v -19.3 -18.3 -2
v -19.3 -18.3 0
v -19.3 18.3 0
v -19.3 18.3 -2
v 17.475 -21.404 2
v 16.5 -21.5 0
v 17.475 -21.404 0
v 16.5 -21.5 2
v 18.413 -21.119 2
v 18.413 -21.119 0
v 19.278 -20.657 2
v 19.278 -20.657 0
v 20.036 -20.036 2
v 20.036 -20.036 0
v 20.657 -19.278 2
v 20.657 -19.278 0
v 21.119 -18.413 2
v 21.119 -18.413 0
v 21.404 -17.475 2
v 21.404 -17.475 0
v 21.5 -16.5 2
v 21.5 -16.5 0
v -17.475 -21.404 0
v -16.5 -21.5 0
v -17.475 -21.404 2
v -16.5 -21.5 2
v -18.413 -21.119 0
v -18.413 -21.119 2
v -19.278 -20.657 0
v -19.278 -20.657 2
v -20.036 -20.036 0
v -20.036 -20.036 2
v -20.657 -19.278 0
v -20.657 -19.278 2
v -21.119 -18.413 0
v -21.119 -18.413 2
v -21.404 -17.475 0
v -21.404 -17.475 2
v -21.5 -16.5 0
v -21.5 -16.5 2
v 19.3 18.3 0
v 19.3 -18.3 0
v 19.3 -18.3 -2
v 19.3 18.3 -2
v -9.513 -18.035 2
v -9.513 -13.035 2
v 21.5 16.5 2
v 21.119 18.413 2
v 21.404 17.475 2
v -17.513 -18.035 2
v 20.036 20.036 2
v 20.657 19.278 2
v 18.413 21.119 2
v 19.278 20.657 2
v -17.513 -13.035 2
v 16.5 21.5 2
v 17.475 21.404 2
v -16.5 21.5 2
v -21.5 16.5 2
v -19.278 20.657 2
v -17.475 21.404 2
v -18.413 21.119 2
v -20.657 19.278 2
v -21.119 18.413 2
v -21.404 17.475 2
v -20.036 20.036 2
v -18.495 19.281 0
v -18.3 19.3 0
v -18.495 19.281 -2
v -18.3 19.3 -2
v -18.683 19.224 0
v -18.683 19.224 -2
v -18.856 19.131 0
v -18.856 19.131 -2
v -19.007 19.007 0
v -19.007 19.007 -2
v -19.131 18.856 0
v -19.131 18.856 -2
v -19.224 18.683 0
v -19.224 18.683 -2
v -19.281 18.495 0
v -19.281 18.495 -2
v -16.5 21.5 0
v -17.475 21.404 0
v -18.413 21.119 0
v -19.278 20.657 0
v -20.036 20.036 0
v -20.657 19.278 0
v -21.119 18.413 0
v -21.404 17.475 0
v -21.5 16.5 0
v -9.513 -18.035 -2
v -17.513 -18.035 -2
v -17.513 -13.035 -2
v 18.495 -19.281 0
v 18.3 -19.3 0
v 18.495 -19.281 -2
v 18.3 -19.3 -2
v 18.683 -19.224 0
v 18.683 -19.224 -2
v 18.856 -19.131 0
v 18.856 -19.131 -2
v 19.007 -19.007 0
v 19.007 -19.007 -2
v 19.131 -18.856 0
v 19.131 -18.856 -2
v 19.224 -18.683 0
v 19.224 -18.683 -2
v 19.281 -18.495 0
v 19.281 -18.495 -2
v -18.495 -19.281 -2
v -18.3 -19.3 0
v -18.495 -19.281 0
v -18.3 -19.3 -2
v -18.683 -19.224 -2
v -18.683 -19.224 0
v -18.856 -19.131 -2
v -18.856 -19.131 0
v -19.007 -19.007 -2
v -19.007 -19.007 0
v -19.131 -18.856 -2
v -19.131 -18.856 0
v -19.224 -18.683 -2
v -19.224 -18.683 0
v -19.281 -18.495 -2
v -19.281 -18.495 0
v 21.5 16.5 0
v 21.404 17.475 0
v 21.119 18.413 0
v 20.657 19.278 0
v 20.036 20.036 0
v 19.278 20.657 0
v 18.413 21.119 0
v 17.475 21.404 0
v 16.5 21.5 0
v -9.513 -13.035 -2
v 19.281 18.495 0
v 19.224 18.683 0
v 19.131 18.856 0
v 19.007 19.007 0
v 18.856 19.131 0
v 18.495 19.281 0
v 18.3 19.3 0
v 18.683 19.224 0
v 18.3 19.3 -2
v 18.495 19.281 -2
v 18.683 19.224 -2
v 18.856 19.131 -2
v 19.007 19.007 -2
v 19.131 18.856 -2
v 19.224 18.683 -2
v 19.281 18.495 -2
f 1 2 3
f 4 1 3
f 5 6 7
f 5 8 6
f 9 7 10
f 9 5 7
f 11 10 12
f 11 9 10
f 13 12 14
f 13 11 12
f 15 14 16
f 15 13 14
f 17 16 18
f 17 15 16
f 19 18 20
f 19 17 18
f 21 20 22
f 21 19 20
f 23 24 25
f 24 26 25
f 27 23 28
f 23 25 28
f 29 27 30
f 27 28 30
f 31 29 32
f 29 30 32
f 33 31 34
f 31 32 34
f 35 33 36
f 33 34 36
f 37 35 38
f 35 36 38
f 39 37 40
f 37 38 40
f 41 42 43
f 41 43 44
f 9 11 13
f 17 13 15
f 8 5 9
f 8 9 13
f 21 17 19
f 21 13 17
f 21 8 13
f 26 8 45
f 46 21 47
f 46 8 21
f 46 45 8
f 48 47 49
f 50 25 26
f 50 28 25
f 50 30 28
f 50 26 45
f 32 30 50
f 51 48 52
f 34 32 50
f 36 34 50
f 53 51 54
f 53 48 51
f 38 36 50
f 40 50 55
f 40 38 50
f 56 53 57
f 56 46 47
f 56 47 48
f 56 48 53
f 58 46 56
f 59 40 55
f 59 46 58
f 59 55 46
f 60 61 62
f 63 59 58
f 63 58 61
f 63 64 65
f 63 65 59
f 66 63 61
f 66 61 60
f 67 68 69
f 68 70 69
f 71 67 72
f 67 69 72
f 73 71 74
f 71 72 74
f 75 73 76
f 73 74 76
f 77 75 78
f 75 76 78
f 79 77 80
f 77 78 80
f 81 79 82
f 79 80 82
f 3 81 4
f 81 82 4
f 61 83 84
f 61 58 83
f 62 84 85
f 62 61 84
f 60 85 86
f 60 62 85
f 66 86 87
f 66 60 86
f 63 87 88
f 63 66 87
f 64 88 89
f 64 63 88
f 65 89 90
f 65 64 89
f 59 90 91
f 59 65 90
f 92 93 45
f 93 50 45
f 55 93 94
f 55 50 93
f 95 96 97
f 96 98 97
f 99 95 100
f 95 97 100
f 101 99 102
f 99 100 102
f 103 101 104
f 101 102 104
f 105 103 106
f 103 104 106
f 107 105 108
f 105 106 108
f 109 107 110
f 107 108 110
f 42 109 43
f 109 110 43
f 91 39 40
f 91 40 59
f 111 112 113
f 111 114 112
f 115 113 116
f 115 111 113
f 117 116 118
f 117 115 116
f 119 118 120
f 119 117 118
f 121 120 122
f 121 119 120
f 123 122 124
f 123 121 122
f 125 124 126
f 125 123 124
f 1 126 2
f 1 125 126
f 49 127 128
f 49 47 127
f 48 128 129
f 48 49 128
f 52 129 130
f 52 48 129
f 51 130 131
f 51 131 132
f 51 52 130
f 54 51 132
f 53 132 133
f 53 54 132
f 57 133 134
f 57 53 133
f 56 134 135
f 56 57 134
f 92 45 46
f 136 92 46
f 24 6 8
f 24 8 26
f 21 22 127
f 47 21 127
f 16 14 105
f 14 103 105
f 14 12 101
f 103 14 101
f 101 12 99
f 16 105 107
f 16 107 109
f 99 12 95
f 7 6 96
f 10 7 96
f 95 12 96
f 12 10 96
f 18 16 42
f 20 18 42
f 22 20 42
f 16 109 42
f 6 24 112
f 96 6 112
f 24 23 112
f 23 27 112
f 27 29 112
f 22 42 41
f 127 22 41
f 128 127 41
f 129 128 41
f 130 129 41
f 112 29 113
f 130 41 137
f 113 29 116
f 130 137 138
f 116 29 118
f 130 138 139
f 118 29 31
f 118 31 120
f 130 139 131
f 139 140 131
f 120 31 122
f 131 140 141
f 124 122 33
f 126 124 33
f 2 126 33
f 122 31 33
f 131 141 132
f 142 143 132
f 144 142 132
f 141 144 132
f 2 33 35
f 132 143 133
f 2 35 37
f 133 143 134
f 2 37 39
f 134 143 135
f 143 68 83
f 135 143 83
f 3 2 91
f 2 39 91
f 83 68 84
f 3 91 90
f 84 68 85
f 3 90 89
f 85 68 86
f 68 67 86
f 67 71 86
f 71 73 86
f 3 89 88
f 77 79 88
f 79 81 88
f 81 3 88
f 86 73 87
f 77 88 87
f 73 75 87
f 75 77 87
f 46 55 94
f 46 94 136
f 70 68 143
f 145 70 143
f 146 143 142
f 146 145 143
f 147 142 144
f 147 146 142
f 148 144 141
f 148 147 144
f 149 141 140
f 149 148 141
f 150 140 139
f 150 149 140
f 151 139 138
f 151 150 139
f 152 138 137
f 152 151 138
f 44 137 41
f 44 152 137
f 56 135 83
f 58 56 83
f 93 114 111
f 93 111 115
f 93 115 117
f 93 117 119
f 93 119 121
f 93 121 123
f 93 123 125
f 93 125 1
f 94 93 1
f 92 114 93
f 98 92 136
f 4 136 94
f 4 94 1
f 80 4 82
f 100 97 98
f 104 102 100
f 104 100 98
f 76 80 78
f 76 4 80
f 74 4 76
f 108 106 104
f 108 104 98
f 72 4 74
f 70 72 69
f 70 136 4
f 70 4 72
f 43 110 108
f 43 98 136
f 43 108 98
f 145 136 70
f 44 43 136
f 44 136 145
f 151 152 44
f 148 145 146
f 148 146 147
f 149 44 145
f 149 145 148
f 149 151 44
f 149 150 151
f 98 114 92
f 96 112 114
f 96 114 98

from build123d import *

# Parameters (mm, degrees)
SKETCH1_W           = 43.000000106
SKETCH1_H           = 43
BOSS_EXTRUDE1_DEPTH = 2
FILLET1_R           = 5
SKETCH2_W           = 8
SKETCH2_H           = 5
CUT_EXTRUDE1_DEPTH  = 31.471298008
SKETCH3_W           = 38.6
SKETCH3_H           = 38.6
SKETCH3_W_2         = 5
SKETCH3_H_2         = 8
BOSS_EXTRUDE2_DEPTH = 2
FILLET3_R           = 1


with BuildPart() as part:
    # Sketch1 → Boss-Extrude1 (new body)
    with BuildSketch(Plane(origin=(0, 0, 0), x_dir=(0, 1, 0), z_dir=(0, 0, 1))):
        Rectangle(SKETCH1_W, SKETCH1_H)
    extrude(amount=BOSS_EXTRUDE1_DEPTH)

    # Fillet1
    fillet1_edges = [part.edges().sort_by_distance(p)[0] for p in [
        (-21.5, -21.500000053, 1),
        (-21.5, 21.500000053, 1),
        (21.5, 21.500000053, 1),
        (21.5, -21.500000053, 1),
    ]]
    fillet(fillet1_edges, radius=FILLET1_R)

    # Sketch2 → Cut-Extrude1 (cut, through all)
    with BuildSketch(Plane.XY.offset(2)):
        with Locations((-13.512700472, -15.534578128)):
            Rectangle(SKETCH2_W, SKETCH2_H)
    extrude(amount=-CUT_EXTRUDE1_DEPTH, mode=Mode.SUBTRACT)

    # Sketch3 → Boss-Extrude2 (add)
    with BuildSketch(Plane.YX):
        Rectangle(SKETCH3_W, SKETCH3_H)
        with Locations((-15.534578128, -13.512700472)):
            Rectangle(SKETCH3_W_2, SKETCH3_H_2, mode=Mode.SUBTRACT)
    extrude(amount=BOSS_EXTRUDE2_DEPTH)

    # Fillet3
    fillet3_edges = [part.edges().sort_by_distance(p)[0] for p in [
        (-19.3, -19.3, -1),
        (-19.3, 19.3, -1),
        (19.3, 19.3, -1),
        (19.3, -19.3, -1),
    ]]
    fillet(fillet3_edges, radius=FILLET3_R)


solid = part.part
